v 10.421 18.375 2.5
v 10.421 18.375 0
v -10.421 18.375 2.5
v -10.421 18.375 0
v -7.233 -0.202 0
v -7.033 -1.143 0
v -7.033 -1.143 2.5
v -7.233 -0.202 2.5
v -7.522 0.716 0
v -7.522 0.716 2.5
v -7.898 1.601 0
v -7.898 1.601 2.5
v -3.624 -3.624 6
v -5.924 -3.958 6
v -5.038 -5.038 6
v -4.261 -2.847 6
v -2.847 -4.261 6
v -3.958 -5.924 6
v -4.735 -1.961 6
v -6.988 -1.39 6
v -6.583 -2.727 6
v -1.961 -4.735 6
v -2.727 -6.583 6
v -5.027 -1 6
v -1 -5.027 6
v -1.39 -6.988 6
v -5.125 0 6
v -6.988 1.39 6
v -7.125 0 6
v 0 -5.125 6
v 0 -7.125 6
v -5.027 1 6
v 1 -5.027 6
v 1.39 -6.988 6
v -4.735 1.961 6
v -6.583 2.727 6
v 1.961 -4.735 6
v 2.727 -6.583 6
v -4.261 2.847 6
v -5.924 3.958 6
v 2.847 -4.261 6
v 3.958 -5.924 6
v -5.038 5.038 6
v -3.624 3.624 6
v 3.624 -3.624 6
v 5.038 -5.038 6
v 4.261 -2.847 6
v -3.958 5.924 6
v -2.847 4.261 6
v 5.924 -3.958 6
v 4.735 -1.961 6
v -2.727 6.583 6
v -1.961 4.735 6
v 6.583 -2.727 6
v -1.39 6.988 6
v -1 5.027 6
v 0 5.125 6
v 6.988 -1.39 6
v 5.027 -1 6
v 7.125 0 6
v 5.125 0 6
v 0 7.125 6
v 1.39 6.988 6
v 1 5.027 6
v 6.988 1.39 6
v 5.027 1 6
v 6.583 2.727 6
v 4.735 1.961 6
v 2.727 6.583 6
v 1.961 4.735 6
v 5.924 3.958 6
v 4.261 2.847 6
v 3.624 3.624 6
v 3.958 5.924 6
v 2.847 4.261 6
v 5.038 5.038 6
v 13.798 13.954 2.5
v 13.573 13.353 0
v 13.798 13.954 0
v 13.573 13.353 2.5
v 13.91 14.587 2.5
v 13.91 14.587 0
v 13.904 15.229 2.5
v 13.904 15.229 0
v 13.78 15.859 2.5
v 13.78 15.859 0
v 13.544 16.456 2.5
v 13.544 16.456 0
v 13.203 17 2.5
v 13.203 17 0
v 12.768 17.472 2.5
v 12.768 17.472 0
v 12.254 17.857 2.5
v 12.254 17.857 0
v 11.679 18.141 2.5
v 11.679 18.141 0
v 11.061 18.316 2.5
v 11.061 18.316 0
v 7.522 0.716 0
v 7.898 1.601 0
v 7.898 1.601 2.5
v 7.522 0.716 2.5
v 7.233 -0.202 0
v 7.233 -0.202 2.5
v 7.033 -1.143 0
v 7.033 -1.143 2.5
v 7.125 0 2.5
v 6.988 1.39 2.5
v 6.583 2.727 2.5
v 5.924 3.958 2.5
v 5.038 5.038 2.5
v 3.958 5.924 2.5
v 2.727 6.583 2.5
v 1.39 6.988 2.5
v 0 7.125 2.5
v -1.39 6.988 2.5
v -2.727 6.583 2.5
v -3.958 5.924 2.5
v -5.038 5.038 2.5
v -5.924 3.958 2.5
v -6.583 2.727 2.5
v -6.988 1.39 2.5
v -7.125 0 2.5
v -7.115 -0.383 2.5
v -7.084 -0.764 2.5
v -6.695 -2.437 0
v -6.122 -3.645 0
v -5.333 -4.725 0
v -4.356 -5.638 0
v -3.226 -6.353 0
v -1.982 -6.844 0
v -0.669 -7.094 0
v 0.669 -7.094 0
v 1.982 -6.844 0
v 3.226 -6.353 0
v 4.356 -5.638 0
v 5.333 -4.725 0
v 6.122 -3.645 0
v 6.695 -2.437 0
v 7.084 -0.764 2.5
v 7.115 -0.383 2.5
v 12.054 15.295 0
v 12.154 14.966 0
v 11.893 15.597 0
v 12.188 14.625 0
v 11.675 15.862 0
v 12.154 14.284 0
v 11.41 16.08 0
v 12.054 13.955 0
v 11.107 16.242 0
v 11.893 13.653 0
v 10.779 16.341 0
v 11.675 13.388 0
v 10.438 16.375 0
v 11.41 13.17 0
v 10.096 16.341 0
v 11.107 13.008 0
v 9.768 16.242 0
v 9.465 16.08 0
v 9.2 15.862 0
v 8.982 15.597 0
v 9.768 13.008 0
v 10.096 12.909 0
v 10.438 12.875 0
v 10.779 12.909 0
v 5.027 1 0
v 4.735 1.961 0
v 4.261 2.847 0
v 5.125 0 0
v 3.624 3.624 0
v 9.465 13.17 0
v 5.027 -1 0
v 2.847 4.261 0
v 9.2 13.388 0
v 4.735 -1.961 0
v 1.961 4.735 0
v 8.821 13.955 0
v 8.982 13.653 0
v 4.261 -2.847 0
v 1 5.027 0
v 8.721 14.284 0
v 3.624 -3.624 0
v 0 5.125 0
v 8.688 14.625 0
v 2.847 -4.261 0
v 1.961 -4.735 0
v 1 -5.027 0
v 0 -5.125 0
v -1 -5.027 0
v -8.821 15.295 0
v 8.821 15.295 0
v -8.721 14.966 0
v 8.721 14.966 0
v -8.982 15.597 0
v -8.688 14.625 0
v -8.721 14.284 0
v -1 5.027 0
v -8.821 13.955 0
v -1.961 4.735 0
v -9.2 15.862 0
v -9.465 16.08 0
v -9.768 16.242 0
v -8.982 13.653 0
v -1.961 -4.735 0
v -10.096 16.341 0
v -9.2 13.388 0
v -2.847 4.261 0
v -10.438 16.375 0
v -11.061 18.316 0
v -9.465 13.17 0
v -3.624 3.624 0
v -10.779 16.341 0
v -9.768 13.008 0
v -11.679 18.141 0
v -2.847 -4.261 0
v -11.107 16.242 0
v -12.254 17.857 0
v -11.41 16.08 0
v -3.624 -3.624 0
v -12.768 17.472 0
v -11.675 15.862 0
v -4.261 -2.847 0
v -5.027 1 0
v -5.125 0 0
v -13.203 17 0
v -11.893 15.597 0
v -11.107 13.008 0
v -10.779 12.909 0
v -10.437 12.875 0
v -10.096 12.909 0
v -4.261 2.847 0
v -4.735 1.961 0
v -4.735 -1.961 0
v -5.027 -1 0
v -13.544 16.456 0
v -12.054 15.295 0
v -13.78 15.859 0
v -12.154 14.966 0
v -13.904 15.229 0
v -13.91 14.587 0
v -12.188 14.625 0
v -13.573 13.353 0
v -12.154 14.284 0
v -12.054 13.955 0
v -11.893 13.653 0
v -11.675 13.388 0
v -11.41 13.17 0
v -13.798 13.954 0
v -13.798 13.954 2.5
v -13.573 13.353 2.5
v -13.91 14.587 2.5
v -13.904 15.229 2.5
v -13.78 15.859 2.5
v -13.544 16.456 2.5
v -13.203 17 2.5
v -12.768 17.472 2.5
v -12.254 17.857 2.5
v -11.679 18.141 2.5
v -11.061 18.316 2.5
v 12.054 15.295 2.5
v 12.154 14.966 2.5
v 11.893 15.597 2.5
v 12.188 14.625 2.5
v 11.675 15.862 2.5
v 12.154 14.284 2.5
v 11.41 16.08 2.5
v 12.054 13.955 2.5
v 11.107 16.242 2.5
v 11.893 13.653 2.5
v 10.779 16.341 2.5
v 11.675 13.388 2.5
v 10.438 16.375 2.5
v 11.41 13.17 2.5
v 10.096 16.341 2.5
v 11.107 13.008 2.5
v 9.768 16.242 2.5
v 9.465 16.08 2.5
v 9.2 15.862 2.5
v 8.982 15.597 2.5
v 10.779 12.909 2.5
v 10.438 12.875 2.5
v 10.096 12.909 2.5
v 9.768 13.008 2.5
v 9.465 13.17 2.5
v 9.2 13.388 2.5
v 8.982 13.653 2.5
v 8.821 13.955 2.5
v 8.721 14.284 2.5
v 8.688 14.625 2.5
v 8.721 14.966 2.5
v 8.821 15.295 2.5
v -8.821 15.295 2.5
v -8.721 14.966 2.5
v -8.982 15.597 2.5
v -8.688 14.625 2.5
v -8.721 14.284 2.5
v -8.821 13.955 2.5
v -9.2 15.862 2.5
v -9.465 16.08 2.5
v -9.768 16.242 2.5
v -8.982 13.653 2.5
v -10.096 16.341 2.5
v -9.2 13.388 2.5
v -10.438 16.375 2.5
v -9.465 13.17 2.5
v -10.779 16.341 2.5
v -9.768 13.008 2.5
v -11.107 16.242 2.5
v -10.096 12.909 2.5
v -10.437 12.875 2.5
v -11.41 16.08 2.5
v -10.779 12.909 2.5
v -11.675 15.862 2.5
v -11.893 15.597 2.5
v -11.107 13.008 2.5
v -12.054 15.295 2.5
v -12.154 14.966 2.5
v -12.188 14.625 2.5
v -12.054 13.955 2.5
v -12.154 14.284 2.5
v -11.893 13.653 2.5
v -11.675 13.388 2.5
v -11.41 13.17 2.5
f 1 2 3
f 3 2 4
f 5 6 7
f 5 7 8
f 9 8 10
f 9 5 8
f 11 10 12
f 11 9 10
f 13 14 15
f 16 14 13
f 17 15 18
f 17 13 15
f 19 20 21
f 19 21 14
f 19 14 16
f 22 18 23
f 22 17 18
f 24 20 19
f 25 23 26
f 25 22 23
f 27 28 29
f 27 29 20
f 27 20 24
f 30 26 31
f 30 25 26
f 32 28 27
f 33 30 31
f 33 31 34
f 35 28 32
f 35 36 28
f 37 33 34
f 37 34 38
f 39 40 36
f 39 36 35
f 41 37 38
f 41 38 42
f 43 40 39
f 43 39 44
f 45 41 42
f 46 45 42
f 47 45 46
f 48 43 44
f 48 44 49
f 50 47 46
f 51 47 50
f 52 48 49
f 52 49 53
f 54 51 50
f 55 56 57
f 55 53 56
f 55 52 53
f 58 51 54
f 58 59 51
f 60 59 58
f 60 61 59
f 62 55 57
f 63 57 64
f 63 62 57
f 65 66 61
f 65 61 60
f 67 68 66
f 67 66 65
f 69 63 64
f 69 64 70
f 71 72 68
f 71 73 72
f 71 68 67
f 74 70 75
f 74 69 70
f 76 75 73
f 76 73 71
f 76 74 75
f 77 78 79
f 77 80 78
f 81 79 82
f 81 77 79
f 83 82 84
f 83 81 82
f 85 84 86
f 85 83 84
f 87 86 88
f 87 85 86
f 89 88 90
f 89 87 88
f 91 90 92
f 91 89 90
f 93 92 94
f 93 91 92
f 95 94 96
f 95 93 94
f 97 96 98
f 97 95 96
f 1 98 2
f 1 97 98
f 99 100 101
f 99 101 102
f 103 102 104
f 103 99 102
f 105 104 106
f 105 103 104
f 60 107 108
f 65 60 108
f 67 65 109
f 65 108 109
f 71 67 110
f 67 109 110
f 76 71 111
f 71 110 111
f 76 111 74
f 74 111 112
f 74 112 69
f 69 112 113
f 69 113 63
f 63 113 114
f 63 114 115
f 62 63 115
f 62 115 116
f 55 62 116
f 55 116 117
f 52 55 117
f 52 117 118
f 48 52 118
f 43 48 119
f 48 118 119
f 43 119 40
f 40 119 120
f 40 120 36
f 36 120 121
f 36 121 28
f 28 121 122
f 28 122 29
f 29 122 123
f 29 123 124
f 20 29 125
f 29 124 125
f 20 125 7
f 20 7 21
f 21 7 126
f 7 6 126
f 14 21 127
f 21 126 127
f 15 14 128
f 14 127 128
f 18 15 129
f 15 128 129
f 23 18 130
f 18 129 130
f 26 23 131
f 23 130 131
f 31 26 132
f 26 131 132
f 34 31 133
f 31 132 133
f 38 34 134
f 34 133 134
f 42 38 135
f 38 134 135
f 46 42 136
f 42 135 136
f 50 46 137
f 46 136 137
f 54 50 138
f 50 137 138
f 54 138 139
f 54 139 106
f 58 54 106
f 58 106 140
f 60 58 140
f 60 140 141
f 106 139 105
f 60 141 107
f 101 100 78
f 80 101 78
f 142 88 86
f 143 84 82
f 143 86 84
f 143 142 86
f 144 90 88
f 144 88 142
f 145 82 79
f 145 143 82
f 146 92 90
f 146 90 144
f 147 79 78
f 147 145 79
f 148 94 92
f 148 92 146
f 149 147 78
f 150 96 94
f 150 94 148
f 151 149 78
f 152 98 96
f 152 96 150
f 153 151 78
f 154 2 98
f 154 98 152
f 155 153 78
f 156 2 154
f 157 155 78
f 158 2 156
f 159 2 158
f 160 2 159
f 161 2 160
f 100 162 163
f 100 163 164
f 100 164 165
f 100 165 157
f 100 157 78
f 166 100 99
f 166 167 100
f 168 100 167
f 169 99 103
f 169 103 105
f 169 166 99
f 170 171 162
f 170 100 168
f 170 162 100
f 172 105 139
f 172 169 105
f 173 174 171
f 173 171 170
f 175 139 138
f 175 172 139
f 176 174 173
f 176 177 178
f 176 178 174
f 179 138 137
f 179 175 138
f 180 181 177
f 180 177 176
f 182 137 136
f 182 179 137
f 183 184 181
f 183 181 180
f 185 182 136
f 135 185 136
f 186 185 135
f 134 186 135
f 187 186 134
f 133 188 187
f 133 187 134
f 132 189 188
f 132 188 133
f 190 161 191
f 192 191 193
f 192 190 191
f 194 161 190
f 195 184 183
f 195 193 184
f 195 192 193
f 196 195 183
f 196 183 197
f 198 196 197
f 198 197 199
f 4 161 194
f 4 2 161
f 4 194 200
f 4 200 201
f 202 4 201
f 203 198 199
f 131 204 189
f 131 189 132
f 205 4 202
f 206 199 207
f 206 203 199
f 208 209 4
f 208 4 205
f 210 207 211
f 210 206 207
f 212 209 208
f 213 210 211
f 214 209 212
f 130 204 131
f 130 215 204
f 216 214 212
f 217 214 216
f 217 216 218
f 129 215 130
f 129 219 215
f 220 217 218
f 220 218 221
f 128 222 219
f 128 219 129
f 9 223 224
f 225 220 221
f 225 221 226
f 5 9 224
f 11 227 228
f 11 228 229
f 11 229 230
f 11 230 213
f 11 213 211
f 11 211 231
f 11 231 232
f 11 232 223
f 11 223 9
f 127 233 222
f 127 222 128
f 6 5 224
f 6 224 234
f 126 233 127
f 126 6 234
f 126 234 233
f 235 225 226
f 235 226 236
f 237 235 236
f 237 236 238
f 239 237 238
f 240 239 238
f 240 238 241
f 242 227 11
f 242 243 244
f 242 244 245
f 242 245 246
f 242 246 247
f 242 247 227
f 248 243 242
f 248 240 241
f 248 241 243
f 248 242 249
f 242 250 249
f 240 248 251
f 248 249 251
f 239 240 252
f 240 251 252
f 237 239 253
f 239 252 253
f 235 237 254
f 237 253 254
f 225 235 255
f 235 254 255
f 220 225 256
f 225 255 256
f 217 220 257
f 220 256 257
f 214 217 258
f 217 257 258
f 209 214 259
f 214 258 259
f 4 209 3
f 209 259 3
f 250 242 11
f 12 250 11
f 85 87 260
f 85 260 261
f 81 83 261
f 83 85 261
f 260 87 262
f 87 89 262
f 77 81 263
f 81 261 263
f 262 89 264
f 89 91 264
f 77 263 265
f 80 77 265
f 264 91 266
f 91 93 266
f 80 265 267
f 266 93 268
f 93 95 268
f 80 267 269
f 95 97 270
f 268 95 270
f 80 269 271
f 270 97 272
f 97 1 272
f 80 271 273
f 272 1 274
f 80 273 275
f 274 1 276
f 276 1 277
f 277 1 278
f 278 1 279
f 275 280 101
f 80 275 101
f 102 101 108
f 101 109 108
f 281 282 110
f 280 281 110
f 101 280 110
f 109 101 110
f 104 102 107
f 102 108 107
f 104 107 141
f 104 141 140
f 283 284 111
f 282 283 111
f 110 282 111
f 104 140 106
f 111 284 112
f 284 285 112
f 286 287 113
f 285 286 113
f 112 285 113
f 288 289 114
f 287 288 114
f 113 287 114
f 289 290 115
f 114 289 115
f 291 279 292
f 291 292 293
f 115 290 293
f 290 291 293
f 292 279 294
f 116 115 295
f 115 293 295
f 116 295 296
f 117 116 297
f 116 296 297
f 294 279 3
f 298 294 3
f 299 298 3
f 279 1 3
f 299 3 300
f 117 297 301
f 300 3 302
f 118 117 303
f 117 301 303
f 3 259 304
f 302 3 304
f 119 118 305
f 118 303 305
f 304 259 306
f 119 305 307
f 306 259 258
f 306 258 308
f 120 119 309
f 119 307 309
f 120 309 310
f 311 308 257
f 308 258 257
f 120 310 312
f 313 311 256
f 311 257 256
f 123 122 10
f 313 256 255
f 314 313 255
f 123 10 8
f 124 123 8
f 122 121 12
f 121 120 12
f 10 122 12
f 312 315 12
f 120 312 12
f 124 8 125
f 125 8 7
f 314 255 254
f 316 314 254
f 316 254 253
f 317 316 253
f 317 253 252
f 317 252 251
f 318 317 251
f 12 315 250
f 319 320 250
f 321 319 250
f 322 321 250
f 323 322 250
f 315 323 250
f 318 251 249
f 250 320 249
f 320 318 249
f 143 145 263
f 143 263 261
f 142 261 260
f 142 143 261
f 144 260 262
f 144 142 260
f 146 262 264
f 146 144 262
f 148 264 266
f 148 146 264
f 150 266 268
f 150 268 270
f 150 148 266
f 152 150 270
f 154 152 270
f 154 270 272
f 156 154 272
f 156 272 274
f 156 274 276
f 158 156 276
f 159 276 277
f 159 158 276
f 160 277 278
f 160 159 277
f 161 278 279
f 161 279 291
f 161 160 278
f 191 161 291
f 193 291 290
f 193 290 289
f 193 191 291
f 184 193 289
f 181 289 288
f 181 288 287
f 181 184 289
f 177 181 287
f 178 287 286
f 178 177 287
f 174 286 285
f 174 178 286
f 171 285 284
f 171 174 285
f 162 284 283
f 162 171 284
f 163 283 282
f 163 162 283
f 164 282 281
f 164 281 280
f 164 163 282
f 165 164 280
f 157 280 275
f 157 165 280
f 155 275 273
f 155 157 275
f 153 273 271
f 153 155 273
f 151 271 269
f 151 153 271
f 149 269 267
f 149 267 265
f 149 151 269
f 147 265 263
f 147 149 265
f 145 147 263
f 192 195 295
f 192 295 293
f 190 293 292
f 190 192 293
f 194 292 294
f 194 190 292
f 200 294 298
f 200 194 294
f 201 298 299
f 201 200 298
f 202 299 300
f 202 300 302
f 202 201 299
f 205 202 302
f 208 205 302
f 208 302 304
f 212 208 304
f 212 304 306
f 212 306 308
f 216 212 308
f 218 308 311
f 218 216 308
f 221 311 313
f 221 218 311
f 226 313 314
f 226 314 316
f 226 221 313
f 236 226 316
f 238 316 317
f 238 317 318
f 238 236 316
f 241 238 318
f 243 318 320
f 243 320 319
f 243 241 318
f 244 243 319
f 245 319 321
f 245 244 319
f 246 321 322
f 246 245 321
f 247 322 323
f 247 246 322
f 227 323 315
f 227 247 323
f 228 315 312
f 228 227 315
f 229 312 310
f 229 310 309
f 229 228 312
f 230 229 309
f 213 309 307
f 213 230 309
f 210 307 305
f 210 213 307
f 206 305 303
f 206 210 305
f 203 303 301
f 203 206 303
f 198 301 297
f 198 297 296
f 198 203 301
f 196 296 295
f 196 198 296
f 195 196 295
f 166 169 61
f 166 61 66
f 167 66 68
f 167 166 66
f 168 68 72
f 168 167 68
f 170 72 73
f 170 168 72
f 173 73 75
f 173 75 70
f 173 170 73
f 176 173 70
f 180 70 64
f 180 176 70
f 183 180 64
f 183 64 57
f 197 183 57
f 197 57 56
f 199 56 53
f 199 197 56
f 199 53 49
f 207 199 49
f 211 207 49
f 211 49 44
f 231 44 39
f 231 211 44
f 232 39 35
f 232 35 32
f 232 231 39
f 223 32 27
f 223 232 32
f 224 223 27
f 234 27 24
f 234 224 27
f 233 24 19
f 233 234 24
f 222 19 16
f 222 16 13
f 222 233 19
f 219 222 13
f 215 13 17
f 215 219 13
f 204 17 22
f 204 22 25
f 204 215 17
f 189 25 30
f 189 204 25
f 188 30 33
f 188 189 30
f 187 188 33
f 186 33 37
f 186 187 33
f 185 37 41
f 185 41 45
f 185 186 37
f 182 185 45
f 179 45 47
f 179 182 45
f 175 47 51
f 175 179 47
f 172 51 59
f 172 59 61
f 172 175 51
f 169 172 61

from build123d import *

# Parameters (mm, degrees)
ESQUISSE1_R        = 7.125
ESQUISSE1_R_2      = 5.125
BOSS_EXTRU_1_DEPTH = 6
ESQUISSE1_3_R      = 1.75
BOSS_EXTRU_2_DEPTH = 2.5
CONG_1_R           = 3.5
CONG_2_R           = 10


with BuildPart() as part:
    # Esquisse1 → Boss.-Extru.1 (new body)
    with BuildSketch(Plane.XY):
        Circle(ESQUISSE1_R)
        Circle(ESQUISSE1_R_2, mode=Mode.SUBTRACT)
    extrude(amount=BOSS_EXTRU_1_DEPTH)

    # Esquisse1<3> → Boss.-Extru.2 (add)
    # profile 1 of 2: a face of its own
    with BuildSketch(Plane.XY):
        with BuildLine():
            Line((-15.998397436, 18.375), (-7.125, 0))
            ThreePointArc((-7.125, 0), (-5.038135816, 5.038135816), (0, 7.125))
            Line((0, 7.125), (0, 18.375))
            Line((0, 18.375), (-15.998397436, 18.375))
        make_face()
        with Locations((-10.4375, 14.625)):
            Circle(ESQUISSE1_3_R, mode=Mode.SUBTRACT)
    # profile 2 of 2: a face of its own
    with BuildSketch(Plane.XY):
        with BuildLine():
            ThreePointArc((0, 7.125), (5.038135816, 5.038135816), (7.125, 0))
            Line((7.125, 0), (15.998397436, 18.375))
            Line((15.998397436, 18.375), (0, 18.375))
            Line((0, 18.375), (0, 7.125))
        make_face()
        with Locations((10.4375, 14.625)):
            Circle(ESQUISSE1_3_R, mode=Mode.SUBTRACT)
    extrude(amount=BOSS_EXTRU_2_DEPTH)

    # Congé1
    cong_1_edges = [part.edges().sort_by_distance(p)[0] for p in [
        (15.998397436, 18.375, 1.25),
        (-15.998397436, 18.375, 1.25),
    ]]
    fillet(cong_1_edges, radius=CONG_1_R)

    # Congé2
    # the kernel refuses this fillet: 10 mm, written as the material it adds along each edge
    with BuildSketch(Plane(origin=(-7.125, 0, 0), x_dir=(0.08048003783871222, -0.9967562207026748, 0), z_dir=(0, 0, 1))) as cong_2_piece_1:
        with BuildLine():
            CenterArc((1.951640918, -9.967562207), CONG_2_R, 94.61615885, 16.543856934)
            Line((-1.658097624, -0.641802846), (0, 0))
            ThreePointArc((0, 0), (0.57342027, -0.023111927), (1.146840539, 0))
        make_face()
    extrude(amount=2.5)
    with BuildSketch(Plane(origin=(7.125, 0, 0), x_dir=(0.4348566812294863, 0.900499676174332, 0), z_dir=(0, 0, 1))) as cong_2_piece_2:
        with BuildLine():
            CenterArc((1.77797599, -10), CONG_2_R, 90, 16.543856934)
            ThreePointArc((-1.069515889, -0.413979449), (-0.526415143, -0.228543352), (0, 0))
            Line((0, 0), (1.77797599, 0))
        make_face()
    extrude(amount=2.5)


solid = part.part
